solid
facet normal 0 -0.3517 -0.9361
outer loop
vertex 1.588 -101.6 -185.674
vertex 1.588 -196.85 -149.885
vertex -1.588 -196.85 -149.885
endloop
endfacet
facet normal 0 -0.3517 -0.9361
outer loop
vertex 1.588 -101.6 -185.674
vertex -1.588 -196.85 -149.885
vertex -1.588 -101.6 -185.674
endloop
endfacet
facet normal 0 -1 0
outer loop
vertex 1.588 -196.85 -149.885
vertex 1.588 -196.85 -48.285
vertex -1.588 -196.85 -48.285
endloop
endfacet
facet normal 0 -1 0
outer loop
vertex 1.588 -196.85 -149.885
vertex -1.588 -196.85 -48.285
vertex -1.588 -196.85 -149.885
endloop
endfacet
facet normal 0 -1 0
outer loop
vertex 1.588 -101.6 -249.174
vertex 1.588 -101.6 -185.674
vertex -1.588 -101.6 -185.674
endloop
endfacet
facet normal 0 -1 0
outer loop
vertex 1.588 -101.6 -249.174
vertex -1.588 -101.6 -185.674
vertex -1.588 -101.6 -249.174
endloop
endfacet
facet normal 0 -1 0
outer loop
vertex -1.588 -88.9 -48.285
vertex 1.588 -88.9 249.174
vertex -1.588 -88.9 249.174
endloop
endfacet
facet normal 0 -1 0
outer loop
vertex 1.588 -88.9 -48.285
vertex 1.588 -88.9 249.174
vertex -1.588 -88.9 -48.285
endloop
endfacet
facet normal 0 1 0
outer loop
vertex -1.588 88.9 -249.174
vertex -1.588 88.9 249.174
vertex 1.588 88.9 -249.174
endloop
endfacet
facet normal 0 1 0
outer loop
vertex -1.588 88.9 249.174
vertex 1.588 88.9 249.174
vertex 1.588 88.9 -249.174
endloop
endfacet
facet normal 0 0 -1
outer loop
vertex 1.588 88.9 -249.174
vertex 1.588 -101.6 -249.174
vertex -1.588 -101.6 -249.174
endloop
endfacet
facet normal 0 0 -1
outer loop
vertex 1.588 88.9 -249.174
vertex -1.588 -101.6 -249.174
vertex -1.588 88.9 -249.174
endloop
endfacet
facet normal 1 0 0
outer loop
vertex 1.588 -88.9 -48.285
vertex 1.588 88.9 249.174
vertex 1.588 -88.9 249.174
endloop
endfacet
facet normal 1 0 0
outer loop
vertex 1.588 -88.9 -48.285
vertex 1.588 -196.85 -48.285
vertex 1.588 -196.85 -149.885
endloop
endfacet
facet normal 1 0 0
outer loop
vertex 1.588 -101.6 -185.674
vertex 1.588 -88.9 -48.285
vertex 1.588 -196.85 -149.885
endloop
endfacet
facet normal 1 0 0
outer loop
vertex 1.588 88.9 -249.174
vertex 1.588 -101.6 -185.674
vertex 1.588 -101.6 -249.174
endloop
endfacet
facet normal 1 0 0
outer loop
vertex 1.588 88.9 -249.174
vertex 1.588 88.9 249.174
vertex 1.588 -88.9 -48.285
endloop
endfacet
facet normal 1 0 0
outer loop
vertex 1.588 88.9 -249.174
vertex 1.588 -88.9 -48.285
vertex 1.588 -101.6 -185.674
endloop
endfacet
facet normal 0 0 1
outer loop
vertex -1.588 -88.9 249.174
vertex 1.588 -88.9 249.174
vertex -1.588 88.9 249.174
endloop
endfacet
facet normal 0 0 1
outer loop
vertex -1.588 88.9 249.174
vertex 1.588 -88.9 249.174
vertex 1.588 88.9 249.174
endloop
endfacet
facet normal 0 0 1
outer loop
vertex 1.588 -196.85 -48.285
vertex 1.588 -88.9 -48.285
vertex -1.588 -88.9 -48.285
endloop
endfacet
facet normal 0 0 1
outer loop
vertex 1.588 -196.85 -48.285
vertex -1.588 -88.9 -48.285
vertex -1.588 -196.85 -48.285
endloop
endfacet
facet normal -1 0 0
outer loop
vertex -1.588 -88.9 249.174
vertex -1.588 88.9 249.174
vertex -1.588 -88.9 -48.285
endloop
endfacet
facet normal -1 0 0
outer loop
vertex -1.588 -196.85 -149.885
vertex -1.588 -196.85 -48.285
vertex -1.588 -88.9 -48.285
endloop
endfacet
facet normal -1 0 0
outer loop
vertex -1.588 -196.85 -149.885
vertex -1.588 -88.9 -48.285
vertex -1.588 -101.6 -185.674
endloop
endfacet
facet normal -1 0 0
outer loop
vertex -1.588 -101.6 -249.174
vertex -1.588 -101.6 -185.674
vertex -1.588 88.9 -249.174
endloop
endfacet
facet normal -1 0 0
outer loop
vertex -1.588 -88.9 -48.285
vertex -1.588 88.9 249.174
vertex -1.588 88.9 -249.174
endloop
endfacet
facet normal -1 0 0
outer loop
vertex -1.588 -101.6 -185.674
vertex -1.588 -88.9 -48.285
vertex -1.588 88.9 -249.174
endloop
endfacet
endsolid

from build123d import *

# Parameters (mm, degrees)
SKETCH1_W           = 498.348
SKETCH1_H           = 177.8
BOSS_EXTRUDE1_DEPTH = 1.5875
BOSS_EXTRUDE2_DEPTH = 3.175


with BuildPart() as part:
    # Sketch1 → Boss-Extrude1 (new, symmetric)
    with BuildSketch(Plane(origin=(0, 0, 0), x_dir=(0, 0, -1), z_dir=(1, 0, 0))):
        Rectangle(SKETCH1_W, SKETCH1_H)
    extrude(amount=BOSS_EXTRUDE1_DEPTH, both=True)

    # Sketch2 → Boss-Extrude2 (add)
    with BuildSketch(Plane(origin=(1.5875, 0, 0), x_dir=(0, 0, -1), z_dir=(1, 0, 0))):
        Polygon((249.174, -101.6), (249.174, -88.9), (48.2854, -88.9), (48.2854, -196.85), (149.8854, -196.85), (185.674, -101.6), align=None)
    extrude(amount=-BOSS_EXTRUDE2_DEPTH)


solid = part.part
